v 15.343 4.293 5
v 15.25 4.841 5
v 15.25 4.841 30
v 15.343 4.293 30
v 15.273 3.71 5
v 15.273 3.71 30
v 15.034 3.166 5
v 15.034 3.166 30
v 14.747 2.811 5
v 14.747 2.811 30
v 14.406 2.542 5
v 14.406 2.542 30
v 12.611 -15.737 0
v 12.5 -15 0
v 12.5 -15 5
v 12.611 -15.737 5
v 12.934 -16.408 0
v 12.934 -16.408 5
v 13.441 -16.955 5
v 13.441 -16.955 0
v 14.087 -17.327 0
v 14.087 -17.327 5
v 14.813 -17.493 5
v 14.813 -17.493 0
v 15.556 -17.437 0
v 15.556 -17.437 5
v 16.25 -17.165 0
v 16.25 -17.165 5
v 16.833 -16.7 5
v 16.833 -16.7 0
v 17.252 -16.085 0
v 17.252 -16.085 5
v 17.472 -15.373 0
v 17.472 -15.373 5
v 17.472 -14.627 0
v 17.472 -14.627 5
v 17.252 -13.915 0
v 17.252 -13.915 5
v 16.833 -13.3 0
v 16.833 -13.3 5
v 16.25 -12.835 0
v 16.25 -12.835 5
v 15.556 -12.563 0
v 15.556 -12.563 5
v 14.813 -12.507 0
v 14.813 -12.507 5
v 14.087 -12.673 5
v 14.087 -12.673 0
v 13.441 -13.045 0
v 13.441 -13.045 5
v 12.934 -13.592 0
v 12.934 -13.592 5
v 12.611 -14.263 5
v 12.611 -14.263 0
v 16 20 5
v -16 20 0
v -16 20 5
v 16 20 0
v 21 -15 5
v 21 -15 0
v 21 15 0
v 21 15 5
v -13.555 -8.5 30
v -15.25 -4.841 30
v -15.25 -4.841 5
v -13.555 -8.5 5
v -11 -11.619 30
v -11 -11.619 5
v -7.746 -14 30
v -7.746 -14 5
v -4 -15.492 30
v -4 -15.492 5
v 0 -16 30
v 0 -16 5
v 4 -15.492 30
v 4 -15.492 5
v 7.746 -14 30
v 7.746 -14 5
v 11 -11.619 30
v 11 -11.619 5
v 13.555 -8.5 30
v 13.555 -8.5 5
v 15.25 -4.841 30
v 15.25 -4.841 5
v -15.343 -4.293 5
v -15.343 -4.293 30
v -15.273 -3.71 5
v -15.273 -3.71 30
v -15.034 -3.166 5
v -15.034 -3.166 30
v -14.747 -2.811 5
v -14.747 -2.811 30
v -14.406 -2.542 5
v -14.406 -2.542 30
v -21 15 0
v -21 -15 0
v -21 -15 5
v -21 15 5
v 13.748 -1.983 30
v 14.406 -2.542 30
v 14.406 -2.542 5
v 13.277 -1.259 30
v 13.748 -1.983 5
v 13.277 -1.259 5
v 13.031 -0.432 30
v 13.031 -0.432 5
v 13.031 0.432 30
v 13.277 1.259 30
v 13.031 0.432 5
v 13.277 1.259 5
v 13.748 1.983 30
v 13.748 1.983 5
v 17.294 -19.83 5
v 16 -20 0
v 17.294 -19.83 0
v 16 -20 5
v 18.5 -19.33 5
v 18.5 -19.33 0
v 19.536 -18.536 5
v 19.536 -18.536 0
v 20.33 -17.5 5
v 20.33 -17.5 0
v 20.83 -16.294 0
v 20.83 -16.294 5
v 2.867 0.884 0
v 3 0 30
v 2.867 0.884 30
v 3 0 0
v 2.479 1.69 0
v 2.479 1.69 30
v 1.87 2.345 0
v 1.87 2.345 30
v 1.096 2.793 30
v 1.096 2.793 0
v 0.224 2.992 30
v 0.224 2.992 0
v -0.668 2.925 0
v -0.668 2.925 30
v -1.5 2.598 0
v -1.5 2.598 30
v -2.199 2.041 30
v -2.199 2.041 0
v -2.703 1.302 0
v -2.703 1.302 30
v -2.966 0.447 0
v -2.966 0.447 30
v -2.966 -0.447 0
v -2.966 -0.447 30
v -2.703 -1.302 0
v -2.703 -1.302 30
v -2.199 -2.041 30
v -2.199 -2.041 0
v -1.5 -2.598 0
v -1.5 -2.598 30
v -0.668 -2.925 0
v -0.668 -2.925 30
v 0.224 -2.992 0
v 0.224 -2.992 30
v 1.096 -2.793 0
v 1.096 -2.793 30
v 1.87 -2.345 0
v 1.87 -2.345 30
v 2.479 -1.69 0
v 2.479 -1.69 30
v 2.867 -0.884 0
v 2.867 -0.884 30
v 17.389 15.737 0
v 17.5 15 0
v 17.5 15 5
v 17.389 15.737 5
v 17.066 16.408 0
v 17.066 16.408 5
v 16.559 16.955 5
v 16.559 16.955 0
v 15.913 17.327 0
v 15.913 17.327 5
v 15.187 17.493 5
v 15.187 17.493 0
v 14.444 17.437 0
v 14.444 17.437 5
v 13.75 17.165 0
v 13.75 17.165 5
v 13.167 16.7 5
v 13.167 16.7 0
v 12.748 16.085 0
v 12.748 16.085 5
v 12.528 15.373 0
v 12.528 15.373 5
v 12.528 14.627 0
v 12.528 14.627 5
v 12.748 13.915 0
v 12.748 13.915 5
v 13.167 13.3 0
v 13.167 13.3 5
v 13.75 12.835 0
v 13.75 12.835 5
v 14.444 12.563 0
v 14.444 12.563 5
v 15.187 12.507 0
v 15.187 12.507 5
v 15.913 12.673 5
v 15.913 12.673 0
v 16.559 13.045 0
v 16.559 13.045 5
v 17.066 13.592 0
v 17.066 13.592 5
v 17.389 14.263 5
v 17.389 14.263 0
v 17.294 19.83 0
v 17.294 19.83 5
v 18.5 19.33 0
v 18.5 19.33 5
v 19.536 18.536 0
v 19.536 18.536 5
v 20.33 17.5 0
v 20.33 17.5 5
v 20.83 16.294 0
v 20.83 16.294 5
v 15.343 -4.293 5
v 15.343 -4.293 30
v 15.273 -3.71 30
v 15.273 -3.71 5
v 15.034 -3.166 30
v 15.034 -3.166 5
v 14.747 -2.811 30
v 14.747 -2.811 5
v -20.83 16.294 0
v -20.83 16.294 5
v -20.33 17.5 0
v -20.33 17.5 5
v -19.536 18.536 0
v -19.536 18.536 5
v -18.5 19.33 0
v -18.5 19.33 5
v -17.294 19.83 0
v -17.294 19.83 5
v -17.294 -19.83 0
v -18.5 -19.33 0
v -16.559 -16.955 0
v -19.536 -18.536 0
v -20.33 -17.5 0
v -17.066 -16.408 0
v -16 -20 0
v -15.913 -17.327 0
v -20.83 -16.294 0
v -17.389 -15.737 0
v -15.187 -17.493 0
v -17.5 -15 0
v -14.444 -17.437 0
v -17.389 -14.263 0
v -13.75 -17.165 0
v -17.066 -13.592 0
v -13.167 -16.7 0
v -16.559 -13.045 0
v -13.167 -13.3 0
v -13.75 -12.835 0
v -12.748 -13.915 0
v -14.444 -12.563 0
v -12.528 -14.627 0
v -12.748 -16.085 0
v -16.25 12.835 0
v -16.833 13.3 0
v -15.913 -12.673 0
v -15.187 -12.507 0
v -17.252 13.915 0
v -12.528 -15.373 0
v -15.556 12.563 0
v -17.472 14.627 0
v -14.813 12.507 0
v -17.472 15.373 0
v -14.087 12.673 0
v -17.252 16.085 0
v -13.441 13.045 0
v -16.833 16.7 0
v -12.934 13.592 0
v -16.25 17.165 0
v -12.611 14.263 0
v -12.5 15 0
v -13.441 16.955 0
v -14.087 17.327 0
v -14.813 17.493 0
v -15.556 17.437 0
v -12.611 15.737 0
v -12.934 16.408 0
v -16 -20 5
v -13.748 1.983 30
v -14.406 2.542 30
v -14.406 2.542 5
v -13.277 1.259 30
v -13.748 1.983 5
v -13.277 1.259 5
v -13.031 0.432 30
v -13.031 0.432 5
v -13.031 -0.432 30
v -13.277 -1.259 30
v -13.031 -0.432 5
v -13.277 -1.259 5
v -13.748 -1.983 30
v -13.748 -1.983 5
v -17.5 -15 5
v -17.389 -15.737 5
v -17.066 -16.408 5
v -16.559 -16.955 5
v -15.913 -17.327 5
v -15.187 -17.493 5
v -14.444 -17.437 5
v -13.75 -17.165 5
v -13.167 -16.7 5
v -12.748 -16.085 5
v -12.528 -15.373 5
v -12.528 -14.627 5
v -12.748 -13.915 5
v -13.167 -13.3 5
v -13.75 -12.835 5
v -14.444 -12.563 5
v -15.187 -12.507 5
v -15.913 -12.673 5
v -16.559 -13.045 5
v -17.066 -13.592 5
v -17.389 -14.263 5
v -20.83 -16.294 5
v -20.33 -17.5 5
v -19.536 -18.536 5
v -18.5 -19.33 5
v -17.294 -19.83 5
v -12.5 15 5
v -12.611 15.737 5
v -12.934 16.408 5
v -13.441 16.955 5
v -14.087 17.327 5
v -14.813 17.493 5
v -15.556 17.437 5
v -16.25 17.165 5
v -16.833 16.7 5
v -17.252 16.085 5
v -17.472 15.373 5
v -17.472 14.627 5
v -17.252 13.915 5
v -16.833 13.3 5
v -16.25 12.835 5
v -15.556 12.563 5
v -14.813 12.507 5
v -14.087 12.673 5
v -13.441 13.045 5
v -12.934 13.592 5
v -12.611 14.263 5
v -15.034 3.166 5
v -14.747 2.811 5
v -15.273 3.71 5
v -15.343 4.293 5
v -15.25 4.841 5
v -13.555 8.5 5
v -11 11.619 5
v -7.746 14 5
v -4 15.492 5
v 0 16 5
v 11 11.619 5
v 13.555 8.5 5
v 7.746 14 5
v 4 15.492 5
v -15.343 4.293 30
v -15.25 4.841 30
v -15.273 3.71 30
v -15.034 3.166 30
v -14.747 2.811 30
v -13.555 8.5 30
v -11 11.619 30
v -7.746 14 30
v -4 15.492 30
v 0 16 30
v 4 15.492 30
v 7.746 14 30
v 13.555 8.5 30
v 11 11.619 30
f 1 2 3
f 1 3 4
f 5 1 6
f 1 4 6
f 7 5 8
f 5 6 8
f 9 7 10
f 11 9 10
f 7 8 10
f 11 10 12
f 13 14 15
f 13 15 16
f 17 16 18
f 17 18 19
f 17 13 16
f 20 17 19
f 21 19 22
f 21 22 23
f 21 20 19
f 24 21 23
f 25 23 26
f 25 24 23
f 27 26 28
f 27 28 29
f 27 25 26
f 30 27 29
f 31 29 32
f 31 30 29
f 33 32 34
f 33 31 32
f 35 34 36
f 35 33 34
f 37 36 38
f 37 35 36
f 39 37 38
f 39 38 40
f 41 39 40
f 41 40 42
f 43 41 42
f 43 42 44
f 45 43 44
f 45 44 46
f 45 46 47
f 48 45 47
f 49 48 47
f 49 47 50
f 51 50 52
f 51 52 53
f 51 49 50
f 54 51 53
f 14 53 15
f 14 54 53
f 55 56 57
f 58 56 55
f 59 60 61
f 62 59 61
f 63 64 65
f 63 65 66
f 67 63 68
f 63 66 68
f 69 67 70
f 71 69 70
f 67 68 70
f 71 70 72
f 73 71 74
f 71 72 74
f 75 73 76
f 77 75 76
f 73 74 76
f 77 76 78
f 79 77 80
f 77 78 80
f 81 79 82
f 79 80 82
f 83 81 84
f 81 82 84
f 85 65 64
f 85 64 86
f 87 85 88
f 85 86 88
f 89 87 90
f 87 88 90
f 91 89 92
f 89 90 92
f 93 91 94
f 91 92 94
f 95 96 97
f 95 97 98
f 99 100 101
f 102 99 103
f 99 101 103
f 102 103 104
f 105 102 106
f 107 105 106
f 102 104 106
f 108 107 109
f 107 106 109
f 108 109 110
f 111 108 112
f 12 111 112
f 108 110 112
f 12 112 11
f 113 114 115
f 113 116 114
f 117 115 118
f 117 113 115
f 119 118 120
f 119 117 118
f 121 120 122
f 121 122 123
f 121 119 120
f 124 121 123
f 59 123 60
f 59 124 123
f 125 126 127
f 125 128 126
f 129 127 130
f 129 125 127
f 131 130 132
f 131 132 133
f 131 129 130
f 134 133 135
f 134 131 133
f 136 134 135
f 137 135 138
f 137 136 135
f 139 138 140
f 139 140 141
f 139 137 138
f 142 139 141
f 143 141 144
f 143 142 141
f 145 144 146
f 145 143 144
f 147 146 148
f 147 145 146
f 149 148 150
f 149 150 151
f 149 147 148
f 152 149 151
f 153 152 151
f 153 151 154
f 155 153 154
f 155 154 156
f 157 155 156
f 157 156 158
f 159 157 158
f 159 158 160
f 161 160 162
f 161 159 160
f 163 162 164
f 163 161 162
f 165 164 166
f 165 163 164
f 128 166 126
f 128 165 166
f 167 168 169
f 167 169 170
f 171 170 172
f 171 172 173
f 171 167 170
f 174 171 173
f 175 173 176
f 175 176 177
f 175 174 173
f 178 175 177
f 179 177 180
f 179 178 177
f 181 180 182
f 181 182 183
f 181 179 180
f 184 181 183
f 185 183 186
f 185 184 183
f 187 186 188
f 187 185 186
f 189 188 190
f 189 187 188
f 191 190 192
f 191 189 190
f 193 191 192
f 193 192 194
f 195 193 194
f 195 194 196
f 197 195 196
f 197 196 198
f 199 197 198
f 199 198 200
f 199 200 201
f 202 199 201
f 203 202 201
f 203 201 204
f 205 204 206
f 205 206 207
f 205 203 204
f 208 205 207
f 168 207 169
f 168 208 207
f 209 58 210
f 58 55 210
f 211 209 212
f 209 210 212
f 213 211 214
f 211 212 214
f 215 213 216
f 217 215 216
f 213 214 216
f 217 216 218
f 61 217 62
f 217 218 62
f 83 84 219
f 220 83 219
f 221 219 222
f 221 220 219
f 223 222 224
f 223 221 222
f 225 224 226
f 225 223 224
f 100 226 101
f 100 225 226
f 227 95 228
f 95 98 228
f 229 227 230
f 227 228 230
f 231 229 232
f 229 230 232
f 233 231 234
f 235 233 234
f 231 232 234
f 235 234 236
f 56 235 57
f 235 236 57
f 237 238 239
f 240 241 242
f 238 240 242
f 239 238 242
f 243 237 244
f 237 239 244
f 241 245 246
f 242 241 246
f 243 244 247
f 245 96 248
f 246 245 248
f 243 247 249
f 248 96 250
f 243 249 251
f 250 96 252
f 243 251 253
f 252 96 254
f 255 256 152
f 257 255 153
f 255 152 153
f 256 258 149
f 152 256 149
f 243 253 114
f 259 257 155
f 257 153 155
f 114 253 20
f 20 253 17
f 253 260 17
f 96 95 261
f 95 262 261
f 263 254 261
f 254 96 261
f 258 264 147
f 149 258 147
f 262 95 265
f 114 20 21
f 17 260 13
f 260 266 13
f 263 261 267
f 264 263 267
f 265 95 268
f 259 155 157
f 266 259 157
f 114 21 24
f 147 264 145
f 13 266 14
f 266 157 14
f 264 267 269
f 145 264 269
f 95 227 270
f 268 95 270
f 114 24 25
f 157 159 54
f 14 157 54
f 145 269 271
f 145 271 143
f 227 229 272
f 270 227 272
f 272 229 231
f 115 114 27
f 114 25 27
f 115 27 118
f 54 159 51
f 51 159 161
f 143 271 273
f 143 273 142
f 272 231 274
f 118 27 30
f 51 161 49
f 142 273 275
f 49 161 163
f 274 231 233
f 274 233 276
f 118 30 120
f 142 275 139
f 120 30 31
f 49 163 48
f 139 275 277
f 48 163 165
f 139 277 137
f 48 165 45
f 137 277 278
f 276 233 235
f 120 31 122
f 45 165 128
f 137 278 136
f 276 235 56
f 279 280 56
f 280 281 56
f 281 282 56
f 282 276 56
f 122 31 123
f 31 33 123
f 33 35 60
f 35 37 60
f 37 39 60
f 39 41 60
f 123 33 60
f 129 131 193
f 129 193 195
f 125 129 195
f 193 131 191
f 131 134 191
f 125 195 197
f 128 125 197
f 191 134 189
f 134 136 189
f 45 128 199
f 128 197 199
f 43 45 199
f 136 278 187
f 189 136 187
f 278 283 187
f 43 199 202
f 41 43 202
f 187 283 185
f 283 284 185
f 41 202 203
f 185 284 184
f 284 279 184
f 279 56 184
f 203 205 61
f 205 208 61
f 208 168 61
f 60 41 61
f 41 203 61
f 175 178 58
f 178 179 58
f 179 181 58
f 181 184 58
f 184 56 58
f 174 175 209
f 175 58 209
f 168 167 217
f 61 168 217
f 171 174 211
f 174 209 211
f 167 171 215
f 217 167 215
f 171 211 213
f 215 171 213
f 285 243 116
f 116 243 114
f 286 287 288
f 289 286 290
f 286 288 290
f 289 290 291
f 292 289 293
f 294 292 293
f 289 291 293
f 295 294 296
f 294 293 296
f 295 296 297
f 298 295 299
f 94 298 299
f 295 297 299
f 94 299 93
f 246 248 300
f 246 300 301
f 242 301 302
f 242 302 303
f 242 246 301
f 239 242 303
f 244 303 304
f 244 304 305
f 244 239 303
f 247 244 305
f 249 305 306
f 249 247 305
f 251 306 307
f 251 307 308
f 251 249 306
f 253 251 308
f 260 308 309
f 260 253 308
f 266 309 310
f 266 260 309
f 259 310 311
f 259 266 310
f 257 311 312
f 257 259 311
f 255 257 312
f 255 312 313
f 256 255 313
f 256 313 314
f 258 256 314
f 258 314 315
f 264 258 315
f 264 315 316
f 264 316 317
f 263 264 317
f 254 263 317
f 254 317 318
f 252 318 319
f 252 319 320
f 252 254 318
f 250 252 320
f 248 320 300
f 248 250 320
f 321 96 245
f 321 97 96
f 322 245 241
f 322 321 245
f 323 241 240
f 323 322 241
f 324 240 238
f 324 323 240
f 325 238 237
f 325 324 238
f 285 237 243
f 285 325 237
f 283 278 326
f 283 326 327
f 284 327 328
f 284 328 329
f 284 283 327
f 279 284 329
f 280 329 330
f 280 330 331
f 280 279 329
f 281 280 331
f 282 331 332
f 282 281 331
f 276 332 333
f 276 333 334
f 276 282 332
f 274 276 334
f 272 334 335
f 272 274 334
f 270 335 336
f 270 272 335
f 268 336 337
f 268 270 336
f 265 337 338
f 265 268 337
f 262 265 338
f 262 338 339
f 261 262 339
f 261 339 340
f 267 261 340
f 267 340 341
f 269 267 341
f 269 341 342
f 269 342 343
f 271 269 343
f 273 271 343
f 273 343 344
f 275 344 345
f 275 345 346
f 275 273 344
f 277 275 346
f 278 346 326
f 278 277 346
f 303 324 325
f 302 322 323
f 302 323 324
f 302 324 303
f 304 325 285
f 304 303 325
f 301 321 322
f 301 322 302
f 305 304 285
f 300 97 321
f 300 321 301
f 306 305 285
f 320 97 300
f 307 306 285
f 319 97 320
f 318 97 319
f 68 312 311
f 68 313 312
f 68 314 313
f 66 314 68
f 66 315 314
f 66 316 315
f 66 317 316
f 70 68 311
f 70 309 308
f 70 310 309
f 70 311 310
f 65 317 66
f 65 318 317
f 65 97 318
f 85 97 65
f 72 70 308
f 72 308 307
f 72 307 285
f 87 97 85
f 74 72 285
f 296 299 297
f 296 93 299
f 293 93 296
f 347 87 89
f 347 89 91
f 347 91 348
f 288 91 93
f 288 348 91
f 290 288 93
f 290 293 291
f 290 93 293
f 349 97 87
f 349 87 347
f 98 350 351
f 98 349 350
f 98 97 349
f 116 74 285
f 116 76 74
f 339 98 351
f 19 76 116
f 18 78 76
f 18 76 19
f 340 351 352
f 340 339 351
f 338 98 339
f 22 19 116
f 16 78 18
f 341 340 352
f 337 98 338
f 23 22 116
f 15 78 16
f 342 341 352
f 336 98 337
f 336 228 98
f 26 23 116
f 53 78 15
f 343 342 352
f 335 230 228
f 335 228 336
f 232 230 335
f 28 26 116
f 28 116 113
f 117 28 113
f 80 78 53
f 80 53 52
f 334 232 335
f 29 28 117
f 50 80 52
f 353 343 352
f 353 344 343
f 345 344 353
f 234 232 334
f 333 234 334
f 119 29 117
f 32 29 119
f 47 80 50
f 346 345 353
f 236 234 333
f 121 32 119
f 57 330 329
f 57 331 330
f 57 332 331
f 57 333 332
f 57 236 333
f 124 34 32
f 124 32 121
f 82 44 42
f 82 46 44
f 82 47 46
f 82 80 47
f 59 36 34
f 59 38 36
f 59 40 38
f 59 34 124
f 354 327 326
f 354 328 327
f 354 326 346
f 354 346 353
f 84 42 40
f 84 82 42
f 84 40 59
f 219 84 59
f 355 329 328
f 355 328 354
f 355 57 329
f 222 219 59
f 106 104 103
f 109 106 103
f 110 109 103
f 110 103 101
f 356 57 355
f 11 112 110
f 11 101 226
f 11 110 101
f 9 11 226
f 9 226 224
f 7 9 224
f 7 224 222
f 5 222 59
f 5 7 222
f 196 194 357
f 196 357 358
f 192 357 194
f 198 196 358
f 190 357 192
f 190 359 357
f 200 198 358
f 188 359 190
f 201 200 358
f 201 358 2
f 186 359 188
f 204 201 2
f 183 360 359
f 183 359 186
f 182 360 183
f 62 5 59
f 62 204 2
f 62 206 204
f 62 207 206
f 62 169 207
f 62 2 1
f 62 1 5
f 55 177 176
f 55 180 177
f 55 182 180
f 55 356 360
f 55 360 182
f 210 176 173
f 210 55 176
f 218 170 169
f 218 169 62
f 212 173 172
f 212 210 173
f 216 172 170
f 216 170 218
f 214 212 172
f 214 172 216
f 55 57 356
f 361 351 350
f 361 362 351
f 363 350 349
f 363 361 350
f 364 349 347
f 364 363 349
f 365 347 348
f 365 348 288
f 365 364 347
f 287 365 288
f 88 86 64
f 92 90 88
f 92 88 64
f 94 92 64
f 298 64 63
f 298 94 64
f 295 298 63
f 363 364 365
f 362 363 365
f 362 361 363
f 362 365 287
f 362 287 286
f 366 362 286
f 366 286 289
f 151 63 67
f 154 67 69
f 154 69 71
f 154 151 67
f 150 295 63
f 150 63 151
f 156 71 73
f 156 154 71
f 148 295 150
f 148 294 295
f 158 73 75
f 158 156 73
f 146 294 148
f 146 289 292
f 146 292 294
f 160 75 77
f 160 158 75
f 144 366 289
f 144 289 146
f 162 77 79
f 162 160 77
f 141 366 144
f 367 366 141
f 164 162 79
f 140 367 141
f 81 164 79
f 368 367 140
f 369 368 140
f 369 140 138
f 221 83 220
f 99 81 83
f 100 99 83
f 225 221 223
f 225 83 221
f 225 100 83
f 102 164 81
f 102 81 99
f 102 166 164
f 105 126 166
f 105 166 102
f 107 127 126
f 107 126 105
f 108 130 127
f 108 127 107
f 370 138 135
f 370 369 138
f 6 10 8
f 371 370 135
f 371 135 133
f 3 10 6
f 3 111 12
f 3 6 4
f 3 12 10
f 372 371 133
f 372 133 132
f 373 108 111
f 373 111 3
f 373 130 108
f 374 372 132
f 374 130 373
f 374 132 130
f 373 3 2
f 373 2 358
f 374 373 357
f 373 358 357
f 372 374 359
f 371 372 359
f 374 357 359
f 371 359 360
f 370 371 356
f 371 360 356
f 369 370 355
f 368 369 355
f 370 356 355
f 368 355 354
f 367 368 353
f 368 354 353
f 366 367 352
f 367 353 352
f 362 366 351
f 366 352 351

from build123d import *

# Parameters (mm, degrees)
SKETCH1_W           = 42
SKETCH1_H           = 40
SKETCH1_R           = 3
SKETCH1_R_2         = 2.5
BOSS_EXTRUDE1_DEPTH = 5
FILLET1_R           = 5
SKETCH2_R           = 3
BOSS_EXTRUDE2_DEPTH = 25
FILLET2_R           = 2


with BuildPart() as part:
    # Sketch1 → Boss-Extrude1 (new body)
    with BuildSketch(Plane.XY):
        Rectangle(SKETCH1_W, SKETCH1_H)
        Circle(SKETCH1_R, mode=Mode.SUBTRACT)
        with Locations((-15, 15)):
            Circle(SKETCH1_R_2, mode=Mode.SUBTRACT)
        with Locations((15, 15)):
            Circle(SKETCH1_R_2, mode=Mode.SUBTRACT)
        with Locations(Location((15, -15, 0), (0, 0, 180))):
            Circle(SKETCH1_R_2, mode=Mode.SUBTRACT)
        with Locations(Location((-15, -15, 0), (0, 0, 180))):
            Circle(SKETCH1_R_2, mode=Mode.SUBTRACT)
    extrude(amount=BOSS_EXTRUDE1_DEPTH)

    # Fillet1
    fillet1_edges = [part.edges().sort_by_distance(p)[0] for p in [
        (21, -20, 2.5),
        (-21, -20, 2.5),
        (-21, 20, 2.5),
        (21, 20, 2.5),
    ]]
    fillet(fillet1_edges, radius=FILLET1_R)

    # Sketch2 → Boss-Extrude2 (add)
    with BuildSketch(Plane.XY.offset(5)):
        with BuildLine():
            ThreePointArc((-15.71875, -2.98678731), (0, -16), (15.71875, -2.98678731))
            ThreePointArc((15.71875, -2.98678731), (13, 0), (15.71875, 2.98678731))
            ThreePointArc((15.71875, 2.98678731), (0, 16), (-15.71875, 2.98678731))
            ThreePointArc((-15.71875, 2.98678731), (-13, 0), (-15.71875, -2.98678731))
        make_face()
        Circle(SKETCH2_R, mode=Mode.SUBTRACT)
    extrude(amount=BOSS_EXTRUDE2_DEPTH)

    # Fillet2
    fillet2_edges = [part.edges().sort_by_distance(p)[0] for p in [
        (15.71875, -2.98678731, 17.5),
        (15.71875, 2.98678731, 17.5),
        (-15.71875, 2.98678731, 17.5),
        (-15.71875, -2.98678731, 17.5),
    ]]
    fillet(fillet2_edges, radius=FILLET2_R)


solid = part.part
